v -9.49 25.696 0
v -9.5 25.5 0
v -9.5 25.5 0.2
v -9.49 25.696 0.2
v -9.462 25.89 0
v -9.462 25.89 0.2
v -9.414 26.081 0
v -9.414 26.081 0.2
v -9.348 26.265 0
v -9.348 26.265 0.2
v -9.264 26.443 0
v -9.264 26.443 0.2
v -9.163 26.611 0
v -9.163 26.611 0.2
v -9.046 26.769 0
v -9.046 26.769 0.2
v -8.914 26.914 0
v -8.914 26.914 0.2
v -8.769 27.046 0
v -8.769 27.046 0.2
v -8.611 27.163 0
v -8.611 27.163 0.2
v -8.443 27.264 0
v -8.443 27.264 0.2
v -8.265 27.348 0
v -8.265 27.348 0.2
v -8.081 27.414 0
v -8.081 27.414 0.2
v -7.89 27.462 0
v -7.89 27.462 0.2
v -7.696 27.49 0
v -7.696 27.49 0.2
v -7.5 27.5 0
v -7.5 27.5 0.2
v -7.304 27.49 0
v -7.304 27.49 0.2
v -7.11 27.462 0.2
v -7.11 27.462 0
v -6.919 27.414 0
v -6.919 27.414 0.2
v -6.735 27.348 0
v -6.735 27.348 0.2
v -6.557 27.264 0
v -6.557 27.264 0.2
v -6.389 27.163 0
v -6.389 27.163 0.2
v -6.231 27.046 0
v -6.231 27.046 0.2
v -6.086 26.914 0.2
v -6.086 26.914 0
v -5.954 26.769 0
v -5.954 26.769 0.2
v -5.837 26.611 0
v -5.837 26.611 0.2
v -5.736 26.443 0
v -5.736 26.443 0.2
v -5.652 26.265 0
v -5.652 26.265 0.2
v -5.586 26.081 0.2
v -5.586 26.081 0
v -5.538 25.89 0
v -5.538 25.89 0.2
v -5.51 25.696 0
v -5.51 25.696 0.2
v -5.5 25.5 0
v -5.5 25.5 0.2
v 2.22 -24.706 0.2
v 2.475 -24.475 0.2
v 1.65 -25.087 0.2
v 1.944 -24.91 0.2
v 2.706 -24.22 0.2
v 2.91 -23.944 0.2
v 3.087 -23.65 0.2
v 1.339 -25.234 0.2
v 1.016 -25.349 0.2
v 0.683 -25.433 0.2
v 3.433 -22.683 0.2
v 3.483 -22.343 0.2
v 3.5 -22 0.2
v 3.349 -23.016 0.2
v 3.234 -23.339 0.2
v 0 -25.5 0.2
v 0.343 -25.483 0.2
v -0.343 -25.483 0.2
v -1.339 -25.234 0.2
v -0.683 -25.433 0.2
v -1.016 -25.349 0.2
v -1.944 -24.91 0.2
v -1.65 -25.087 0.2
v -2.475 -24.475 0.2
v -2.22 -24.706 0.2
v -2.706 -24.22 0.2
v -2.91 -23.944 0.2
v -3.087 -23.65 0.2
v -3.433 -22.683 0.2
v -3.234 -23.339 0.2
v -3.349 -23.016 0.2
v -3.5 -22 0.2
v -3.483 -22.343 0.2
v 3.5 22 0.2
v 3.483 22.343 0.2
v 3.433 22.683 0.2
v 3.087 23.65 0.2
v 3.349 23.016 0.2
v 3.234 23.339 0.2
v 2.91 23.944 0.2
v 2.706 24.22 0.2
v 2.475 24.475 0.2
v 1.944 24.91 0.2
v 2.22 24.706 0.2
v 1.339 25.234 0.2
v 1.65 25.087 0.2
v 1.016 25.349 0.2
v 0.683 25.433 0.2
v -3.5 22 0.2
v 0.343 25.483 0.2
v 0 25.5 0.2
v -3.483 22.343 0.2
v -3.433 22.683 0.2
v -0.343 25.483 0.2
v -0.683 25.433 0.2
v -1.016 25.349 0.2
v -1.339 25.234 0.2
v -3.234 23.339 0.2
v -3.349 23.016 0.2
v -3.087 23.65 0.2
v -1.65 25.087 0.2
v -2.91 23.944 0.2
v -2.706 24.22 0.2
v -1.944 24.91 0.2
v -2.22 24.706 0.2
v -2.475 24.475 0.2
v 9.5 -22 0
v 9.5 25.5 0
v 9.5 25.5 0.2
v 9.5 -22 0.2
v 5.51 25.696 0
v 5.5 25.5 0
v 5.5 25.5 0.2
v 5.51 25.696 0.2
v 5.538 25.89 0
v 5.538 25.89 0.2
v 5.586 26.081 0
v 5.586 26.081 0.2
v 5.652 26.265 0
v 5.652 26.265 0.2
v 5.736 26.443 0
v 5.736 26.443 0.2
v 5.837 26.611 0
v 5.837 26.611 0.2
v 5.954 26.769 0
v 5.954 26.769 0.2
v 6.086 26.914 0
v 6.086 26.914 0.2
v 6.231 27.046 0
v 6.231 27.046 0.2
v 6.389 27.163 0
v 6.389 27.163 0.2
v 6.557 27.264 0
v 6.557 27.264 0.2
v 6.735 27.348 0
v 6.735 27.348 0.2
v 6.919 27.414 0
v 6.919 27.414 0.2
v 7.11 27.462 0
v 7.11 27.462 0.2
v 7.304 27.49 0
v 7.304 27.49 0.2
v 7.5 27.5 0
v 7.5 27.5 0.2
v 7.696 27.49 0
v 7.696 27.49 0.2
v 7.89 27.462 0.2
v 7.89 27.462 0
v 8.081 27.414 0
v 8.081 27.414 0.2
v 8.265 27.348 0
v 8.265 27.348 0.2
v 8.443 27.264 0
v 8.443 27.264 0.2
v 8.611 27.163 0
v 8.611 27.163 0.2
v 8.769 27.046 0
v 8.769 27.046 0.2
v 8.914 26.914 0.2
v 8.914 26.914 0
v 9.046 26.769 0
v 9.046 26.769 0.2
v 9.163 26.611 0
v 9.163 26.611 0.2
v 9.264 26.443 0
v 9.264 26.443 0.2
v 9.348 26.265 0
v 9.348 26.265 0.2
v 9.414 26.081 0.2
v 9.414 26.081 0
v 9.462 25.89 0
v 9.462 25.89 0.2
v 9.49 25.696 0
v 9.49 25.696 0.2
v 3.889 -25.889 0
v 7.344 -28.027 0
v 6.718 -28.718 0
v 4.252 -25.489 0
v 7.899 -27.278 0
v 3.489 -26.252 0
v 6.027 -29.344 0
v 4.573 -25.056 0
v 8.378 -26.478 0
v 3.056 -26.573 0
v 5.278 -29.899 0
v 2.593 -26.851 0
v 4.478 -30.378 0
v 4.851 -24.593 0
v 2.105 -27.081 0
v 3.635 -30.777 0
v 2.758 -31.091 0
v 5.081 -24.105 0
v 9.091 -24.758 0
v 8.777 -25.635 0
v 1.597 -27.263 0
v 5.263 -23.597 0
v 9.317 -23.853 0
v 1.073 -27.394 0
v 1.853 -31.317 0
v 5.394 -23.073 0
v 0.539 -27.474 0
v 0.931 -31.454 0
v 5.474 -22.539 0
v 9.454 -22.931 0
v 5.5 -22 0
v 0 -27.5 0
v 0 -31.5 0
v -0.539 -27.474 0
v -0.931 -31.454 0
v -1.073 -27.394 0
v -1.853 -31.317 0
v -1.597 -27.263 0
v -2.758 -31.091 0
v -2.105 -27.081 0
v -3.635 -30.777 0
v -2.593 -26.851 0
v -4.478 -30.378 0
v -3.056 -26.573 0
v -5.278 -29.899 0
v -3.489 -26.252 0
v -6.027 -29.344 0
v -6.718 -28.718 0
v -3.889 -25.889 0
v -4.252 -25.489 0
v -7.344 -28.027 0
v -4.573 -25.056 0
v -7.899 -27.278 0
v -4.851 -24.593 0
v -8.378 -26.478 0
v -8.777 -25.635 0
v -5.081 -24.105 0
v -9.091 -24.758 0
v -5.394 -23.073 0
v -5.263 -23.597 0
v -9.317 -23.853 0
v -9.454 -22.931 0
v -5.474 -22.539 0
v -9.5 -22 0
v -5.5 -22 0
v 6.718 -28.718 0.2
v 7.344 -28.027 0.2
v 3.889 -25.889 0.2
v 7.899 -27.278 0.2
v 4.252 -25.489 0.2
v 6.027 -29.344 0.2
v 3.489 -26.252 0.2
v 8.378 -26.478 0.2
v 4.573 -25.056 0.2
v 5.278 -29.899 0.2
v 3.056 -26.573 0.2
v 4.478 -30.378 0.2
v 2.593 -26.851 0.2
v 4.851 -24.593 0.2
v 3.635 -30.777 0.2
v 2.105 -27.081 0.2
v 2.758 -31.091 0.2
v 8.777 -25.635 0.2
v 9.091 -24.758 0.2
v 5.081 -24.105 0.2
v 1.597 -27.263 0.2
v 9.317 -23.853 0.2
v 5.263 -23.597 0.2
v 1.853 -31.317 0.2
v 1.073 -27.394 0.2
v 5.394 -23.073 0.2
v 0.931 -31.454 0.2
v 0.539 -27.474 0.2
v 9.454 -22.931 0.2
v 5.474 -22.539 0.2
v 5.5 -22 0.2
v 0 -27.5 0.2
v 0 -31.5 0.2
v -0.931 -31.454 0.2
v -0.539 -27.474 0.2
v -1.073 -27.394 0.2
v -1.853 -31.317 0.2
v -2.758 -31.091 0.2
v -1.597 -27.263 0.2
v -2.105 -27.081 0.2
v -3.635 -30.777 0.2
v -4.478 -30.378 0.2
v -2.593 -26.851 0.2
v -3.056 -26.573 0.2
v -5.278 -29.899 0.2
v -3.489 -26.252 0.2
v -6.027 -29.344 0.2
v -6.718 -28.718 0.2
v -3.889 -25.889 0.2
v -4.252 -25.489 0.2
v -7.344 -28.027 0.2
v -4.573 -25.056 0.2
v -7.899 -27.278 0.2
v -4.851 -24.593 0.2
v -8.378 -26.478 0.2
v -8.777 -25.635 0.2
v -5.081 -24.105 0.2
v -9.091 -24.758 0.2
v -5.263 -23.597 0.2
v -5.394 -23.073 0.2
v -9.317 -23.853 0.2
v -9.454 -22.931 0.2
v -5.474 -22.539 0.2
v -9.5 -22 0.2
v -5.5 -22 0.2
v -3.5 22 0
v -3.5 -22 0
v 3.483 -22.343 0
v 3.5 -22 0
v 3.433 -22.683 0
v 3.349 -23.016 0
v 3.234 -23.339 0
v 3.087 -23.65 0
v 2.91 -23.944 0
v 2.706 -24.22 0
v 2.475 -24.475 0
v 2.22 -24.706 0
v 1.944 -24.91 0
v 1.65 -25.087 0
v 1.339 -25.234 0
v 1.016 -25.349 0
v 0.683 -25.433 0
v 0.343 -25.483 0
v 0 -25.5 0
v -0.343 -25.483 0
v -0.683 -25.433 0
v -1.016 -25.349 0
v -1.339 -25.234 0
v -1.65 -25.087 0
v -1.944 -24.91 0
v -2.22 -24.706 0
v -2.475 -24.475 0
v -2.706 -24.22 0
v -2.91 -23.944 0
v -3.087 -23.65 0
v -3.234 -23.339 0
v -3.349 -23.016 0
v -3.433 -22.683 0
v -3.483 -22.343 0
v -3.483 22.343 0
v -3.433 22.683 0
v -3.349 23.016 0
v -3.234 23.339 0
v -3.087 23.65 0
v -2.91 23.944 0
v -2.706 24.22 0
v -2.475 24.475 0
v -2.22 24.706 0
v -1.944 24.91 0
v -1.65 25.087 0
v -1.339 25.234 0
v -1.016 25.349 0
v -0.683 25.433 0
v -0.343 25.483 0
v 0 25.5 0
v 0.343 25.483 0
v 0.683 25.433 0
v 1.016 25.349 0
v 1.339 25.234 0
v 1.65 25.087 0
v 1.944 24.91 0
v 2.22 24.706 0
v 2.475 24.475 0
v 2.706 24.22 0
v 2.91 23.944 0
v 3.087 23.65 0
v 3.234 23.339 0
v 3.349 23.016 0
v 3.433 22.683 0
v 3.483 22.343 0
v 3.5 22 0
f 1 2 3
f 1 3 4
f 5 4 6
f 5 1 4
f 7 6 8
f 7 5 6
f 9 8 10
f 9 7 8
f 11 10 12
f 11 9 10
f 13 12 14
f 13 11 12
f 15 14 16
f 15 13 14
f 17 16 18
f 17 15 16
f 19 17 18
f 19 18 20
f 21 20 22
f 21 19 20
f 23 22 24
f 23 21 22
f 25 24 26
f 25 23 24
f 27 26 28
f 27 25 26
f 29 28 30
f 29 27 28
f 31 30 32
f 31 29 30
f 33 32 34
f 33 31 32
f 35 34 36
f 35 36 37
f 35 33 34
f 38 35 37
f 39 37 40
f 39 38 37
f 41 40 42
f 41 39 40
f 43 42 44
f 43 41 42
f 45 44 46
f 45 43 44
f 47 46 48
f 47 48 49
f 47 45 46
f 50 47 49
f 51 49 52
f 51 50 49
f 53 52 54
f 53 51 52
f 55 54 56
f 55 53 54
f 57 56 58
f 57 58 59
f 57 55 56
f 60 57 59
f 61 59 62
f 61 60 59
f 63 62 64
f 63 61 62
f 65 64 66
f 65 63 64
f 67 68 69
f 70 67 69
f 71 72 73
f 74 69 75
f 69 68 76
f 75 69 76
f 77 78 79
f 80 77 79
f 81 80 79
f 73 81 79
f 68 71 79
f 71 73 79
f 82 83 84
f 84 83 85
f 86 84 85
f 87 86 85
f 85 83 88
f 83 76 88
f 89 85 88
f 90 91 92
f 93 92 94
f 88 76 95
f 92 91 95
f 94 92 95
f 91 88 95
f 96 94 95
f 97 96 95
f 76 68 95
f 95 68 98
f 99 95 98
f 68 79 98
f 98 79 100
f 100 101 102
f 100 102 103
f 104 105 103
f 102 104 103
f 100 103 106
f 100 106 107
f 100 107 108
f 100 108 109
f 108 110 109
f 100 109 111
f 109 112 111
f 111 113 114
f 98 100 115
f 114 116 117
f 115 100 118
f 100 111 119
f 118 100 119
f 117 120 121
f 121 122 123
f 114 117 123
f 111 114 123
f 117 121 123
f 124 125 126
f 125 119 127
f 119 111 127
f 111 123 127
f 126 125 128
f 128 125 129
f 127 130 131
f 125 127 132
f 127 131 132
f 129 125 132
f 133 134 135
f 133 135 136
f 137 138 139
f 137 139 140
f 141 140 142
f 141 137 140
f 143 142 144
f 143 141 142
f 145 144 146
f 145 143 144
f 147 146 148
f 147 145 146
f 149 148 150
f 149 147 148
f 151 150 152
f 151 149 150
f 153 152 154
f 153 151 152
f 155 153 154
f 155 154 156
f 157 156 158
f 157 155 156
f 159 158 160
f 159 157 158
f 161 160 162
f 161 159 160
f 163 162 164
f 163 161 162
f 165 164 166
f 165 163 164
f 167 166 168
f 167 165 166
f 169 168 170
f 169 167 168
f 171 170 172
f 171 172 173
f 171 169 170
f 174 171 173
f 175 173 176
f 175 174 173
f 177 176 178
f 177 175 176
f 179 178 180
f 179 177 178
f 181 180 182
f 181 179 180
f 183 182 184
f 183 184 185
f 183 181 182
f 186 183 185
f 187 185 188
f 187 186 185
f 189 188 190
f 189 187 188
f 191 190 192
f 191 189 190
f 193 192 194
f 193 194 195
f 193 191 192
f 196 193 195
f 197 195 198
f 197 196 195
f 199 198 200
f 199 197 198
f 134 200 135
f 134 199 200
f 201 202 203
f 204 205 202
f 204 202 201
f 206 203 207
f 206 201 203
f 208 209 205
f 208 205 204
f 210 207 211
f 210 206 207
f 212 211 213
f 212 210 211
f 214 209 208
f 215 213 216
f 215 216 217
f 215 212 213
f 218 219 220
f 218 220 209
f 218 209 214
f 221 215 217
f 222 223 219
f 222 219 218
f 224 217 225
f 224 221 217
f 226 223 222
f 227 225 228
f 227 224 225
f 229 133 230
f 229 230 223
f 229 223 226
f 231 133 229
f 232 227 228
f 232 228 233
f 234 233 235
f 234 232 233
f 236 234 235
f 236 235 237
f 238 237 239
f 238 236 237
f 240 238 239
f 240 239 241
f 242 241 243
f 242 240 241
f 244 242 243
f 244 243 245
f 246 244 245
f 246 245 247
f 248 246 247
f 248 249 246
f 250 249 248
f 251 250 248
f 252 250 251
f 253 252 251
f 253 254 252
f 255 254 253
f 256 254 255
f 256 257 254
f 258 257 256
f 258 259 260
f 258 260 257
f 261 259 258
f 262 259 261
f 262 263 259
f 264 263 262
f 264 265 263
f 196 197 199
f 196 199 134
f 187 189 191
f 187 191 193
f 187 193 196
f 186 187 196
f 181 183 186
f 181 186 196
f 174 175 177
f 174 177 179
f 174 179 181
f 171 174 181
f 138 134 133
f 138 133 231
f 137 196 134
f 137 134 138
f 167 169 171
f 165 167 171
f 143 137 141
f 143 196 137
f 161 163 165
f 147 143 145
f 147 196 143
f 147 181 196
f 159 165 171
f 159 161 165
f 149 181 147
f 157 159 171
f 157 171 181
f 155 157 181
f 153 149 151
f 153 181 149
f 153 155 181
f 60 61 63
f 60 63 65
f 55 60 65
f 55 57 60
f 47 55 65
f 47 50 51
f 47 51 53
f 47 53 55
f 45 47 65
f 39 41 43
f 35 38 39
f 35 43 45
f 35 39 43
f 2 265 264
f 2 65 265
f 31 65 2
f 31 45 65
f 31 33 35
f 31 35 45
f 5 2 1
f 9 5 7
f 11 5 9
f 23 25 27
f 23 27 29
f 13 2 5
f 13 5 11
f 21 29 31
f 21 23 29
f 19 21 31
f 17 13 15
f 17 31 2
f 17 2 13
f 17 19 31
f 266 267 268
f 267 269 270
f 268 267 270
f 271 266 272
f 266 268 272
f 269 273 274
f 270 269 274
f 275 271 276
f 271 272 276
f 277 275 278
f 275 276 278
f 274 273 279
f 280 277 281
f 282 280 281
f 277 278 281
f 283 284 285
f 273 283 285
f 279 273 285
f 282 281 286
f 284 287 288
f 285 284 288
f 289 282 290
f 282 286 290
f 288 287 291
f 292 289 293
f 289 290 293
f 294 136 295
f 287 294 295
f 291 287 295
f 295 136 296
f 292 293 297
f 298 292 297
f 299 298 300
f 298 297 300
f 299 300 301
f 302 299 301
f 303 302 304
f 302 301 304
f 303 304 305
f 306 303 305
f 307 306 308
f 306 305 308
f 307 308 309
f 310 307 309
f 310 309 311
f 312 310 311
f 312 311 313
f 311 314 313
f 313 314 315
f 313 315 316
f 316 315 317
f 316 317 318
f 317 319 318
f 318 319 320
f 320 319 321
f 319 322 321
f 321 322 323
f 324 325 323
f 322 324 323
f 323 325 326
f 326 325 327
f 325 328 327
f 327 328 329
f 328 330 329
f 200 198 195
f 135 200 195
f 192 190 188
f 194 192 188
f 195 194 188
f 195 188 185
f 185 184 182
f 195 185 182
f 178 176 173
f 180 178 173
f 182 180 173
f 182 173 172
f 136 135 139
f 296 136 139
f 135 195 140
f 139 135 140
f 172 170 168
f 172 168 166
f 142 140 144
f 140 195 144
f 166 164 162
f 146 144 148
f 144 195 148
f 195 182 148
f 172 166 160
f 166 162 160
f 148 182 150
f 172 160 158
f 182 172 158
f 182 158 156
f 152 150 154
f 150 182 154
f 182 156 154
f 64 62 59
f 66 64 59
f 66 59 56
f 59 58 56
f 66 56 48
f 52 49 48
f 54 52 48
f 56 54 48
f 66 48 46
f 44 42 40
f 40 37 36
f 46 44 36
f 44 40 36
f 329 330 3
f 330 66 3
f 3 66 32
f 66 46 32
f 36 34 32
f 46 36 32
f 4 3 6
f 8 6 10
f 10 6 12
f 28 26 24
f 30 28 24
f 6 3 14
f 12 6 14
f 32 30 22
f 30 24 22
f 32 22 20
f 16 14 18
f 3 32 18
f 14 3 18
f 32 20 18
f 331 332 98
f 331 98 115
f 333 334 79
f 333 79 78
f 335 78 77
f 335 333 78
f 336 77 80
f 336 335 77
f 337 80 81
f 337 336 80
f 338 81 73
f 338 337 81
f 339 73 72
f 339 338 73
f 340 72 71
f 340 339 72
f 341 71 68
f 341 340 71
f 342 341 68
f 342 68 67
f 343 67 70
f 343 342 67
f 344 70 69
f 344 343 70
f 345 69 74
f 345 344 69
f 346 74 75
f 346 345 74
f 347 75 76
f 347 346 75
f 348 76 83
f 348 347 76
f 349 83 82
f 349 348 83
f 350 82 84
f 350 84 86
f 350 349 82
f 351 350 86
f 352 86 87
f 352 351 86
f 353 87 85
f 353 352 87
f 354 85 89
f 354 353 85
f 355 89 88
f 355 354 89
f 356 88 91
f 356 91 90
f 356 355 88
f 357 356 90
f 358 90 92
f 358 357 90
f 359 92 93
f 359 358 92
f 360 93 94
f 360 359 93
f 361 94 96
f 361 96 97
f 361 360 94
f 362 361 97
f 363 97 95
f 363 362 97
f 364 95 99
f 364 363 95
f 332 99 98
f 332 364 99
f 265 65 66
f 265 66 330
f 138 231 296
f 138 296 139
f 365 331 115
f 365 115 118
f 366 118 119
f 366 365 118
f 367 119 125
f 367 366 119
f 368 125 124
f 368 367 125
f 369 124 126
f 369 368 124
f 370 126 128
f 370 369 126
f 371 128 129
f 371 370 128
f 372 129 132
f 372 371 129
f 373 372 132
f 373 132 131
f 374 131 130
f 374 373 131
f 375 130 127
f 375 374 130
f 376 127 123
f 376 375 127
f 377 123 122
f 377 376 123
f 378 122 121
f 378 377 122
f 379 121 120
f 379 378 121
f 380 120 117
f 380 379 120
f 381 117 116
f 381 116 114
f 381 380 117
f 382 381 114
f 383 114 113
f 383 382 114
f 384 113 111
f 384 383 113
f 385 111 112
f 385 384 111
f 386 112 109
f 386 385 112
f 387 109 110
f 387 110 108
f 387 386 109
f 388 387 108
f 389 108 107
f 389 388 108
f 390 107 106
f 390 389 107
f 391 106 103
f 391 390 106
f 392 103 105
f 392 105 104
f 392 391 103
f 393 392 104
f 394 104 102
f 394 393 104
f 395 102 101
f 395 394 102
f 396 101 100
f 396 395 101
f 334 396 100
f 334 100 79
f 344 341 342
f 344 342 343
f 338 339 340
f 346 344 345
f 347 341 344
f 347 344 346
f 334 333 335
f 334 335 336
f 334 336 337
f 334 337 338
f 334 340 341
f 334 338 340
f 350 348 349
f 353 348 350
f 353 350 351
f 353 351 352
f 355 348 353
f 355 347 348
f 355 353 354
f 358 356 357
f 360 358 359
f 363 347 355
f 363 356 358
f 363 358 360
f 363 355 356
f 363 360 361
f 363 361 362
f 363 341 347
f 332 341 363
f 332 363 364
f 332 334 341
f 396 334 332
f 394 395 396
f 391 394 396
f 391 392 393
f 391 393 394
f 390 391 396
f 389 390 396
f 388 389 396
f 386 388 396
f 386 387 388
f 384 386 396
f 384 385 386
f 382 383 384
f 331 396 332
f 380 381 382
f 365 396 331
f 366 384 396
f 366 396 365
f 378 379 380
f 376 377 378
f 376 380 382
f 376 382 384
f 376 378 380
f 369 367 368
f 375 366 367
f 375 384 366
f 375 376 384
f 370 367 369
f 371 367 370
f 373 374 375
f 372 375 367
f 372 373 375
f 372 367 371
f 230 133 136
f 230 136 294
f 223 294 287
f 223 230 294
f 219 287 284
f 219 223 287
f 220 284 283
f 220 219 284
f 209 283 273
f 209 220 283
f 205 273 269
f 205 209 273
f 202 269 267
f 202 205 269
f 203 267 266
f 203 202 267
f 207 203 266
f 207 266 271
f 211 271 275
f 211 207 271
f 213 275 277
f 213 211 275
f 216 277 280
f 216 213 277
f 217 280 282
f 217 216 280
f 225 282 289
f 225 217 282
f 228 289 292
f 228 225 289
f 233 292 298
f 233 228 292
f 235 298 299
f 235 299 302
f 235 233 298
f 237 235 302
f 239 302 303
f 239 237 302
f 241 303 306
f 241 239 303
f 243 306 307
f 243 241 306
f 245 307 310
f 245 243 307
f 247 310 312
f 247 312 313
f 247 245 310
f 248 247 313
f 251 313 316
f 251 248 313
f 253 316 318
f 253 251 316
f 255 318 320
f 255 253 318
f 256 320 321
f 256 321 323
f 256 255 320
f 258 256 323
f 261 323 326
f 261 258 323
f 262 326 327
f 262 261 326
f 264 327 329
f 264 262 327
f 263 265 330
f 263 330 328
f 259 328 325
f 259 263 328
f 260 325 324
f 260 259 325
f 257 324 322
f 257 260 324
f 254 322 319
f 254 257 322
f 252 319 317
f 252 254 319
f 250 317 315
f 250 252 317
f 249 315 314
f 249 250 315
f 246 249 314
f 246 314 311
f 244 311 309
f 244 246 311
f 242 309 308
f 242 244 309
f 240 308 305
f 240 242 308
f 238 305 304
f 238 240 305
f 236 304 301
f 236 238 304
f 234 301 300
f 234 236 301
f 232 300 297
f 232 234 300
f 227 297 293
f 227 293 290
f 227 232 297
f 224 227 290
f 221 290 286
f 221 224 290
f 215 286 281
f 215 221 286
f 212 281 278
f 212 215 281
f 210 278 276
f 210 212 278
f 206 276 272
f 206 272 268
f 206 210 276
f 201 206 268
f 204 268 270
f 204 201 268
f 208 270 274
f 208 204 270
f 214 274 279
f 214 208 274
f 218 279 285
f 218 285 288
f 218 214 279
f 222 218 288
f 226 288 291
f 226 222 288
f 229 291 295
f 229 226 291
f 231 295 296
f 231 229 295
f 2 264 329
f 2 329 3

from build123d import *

# Parameters (mm, degrees)
Y_KSEKLIK_EKSTR_ZYON1_DEPTH   = 0.2
Y_KSEKLIK_EKSTR_ZYON1_2_DEPTH = 0.2


with BuildPart() as part:
    # Çizim1 → Yükseklik-Ekstrüzyon1 (new body)
    with BuildSketch(Plane.XY):
        with BuildLine():
            Line((3.5, 22), (3.5, -22))
            ThreePointArc((3.5, -22), (0, -25.5), (-3.5, -22))
            Line((-3.5, -22), (-3.5, 22))
            ThreePointArc((-3.5, 22), (0, 25.5), (3.5, 22))
        make_face()
    extrude(amount=Y_KSEKLIK_EKSTR_ZYON1_DEPTH)


with BuildPart() as body_2:
    # Çizim1 → Y_kseklik-Ekstr_zyon1 2 (new body)
    with BuildSketch(Plane.XY):
        with BuildLine():
            Line((9.5, 25.5), (9.5, -22))
            ThreePointArc((9.5, -22), (0, -31.5), (-9.5, -22))
            Line((-9.5, -22), (-9.5, 25.5))
            ThreePointArc((-9.5, 25.5), (-7.5, 27.5), (-5.5, 25.5))
            Line((-5.5, 25.5), (-5.5, -22))
            ThreePointArc((-5.5, -22), (0, -27.5), (5.5, -22))
            Line((5.5, -22), (5.5, 25.5))
            ThreePointArc((5.5, 25.5), (7.5, 27.5), (9.5, 25.5))
        make_face()
    extrude(amount=Y_KSEKLIK_EKSTR_ZYON1_2_DEPTH)


solid = Compound([part.part, body_2.part])
